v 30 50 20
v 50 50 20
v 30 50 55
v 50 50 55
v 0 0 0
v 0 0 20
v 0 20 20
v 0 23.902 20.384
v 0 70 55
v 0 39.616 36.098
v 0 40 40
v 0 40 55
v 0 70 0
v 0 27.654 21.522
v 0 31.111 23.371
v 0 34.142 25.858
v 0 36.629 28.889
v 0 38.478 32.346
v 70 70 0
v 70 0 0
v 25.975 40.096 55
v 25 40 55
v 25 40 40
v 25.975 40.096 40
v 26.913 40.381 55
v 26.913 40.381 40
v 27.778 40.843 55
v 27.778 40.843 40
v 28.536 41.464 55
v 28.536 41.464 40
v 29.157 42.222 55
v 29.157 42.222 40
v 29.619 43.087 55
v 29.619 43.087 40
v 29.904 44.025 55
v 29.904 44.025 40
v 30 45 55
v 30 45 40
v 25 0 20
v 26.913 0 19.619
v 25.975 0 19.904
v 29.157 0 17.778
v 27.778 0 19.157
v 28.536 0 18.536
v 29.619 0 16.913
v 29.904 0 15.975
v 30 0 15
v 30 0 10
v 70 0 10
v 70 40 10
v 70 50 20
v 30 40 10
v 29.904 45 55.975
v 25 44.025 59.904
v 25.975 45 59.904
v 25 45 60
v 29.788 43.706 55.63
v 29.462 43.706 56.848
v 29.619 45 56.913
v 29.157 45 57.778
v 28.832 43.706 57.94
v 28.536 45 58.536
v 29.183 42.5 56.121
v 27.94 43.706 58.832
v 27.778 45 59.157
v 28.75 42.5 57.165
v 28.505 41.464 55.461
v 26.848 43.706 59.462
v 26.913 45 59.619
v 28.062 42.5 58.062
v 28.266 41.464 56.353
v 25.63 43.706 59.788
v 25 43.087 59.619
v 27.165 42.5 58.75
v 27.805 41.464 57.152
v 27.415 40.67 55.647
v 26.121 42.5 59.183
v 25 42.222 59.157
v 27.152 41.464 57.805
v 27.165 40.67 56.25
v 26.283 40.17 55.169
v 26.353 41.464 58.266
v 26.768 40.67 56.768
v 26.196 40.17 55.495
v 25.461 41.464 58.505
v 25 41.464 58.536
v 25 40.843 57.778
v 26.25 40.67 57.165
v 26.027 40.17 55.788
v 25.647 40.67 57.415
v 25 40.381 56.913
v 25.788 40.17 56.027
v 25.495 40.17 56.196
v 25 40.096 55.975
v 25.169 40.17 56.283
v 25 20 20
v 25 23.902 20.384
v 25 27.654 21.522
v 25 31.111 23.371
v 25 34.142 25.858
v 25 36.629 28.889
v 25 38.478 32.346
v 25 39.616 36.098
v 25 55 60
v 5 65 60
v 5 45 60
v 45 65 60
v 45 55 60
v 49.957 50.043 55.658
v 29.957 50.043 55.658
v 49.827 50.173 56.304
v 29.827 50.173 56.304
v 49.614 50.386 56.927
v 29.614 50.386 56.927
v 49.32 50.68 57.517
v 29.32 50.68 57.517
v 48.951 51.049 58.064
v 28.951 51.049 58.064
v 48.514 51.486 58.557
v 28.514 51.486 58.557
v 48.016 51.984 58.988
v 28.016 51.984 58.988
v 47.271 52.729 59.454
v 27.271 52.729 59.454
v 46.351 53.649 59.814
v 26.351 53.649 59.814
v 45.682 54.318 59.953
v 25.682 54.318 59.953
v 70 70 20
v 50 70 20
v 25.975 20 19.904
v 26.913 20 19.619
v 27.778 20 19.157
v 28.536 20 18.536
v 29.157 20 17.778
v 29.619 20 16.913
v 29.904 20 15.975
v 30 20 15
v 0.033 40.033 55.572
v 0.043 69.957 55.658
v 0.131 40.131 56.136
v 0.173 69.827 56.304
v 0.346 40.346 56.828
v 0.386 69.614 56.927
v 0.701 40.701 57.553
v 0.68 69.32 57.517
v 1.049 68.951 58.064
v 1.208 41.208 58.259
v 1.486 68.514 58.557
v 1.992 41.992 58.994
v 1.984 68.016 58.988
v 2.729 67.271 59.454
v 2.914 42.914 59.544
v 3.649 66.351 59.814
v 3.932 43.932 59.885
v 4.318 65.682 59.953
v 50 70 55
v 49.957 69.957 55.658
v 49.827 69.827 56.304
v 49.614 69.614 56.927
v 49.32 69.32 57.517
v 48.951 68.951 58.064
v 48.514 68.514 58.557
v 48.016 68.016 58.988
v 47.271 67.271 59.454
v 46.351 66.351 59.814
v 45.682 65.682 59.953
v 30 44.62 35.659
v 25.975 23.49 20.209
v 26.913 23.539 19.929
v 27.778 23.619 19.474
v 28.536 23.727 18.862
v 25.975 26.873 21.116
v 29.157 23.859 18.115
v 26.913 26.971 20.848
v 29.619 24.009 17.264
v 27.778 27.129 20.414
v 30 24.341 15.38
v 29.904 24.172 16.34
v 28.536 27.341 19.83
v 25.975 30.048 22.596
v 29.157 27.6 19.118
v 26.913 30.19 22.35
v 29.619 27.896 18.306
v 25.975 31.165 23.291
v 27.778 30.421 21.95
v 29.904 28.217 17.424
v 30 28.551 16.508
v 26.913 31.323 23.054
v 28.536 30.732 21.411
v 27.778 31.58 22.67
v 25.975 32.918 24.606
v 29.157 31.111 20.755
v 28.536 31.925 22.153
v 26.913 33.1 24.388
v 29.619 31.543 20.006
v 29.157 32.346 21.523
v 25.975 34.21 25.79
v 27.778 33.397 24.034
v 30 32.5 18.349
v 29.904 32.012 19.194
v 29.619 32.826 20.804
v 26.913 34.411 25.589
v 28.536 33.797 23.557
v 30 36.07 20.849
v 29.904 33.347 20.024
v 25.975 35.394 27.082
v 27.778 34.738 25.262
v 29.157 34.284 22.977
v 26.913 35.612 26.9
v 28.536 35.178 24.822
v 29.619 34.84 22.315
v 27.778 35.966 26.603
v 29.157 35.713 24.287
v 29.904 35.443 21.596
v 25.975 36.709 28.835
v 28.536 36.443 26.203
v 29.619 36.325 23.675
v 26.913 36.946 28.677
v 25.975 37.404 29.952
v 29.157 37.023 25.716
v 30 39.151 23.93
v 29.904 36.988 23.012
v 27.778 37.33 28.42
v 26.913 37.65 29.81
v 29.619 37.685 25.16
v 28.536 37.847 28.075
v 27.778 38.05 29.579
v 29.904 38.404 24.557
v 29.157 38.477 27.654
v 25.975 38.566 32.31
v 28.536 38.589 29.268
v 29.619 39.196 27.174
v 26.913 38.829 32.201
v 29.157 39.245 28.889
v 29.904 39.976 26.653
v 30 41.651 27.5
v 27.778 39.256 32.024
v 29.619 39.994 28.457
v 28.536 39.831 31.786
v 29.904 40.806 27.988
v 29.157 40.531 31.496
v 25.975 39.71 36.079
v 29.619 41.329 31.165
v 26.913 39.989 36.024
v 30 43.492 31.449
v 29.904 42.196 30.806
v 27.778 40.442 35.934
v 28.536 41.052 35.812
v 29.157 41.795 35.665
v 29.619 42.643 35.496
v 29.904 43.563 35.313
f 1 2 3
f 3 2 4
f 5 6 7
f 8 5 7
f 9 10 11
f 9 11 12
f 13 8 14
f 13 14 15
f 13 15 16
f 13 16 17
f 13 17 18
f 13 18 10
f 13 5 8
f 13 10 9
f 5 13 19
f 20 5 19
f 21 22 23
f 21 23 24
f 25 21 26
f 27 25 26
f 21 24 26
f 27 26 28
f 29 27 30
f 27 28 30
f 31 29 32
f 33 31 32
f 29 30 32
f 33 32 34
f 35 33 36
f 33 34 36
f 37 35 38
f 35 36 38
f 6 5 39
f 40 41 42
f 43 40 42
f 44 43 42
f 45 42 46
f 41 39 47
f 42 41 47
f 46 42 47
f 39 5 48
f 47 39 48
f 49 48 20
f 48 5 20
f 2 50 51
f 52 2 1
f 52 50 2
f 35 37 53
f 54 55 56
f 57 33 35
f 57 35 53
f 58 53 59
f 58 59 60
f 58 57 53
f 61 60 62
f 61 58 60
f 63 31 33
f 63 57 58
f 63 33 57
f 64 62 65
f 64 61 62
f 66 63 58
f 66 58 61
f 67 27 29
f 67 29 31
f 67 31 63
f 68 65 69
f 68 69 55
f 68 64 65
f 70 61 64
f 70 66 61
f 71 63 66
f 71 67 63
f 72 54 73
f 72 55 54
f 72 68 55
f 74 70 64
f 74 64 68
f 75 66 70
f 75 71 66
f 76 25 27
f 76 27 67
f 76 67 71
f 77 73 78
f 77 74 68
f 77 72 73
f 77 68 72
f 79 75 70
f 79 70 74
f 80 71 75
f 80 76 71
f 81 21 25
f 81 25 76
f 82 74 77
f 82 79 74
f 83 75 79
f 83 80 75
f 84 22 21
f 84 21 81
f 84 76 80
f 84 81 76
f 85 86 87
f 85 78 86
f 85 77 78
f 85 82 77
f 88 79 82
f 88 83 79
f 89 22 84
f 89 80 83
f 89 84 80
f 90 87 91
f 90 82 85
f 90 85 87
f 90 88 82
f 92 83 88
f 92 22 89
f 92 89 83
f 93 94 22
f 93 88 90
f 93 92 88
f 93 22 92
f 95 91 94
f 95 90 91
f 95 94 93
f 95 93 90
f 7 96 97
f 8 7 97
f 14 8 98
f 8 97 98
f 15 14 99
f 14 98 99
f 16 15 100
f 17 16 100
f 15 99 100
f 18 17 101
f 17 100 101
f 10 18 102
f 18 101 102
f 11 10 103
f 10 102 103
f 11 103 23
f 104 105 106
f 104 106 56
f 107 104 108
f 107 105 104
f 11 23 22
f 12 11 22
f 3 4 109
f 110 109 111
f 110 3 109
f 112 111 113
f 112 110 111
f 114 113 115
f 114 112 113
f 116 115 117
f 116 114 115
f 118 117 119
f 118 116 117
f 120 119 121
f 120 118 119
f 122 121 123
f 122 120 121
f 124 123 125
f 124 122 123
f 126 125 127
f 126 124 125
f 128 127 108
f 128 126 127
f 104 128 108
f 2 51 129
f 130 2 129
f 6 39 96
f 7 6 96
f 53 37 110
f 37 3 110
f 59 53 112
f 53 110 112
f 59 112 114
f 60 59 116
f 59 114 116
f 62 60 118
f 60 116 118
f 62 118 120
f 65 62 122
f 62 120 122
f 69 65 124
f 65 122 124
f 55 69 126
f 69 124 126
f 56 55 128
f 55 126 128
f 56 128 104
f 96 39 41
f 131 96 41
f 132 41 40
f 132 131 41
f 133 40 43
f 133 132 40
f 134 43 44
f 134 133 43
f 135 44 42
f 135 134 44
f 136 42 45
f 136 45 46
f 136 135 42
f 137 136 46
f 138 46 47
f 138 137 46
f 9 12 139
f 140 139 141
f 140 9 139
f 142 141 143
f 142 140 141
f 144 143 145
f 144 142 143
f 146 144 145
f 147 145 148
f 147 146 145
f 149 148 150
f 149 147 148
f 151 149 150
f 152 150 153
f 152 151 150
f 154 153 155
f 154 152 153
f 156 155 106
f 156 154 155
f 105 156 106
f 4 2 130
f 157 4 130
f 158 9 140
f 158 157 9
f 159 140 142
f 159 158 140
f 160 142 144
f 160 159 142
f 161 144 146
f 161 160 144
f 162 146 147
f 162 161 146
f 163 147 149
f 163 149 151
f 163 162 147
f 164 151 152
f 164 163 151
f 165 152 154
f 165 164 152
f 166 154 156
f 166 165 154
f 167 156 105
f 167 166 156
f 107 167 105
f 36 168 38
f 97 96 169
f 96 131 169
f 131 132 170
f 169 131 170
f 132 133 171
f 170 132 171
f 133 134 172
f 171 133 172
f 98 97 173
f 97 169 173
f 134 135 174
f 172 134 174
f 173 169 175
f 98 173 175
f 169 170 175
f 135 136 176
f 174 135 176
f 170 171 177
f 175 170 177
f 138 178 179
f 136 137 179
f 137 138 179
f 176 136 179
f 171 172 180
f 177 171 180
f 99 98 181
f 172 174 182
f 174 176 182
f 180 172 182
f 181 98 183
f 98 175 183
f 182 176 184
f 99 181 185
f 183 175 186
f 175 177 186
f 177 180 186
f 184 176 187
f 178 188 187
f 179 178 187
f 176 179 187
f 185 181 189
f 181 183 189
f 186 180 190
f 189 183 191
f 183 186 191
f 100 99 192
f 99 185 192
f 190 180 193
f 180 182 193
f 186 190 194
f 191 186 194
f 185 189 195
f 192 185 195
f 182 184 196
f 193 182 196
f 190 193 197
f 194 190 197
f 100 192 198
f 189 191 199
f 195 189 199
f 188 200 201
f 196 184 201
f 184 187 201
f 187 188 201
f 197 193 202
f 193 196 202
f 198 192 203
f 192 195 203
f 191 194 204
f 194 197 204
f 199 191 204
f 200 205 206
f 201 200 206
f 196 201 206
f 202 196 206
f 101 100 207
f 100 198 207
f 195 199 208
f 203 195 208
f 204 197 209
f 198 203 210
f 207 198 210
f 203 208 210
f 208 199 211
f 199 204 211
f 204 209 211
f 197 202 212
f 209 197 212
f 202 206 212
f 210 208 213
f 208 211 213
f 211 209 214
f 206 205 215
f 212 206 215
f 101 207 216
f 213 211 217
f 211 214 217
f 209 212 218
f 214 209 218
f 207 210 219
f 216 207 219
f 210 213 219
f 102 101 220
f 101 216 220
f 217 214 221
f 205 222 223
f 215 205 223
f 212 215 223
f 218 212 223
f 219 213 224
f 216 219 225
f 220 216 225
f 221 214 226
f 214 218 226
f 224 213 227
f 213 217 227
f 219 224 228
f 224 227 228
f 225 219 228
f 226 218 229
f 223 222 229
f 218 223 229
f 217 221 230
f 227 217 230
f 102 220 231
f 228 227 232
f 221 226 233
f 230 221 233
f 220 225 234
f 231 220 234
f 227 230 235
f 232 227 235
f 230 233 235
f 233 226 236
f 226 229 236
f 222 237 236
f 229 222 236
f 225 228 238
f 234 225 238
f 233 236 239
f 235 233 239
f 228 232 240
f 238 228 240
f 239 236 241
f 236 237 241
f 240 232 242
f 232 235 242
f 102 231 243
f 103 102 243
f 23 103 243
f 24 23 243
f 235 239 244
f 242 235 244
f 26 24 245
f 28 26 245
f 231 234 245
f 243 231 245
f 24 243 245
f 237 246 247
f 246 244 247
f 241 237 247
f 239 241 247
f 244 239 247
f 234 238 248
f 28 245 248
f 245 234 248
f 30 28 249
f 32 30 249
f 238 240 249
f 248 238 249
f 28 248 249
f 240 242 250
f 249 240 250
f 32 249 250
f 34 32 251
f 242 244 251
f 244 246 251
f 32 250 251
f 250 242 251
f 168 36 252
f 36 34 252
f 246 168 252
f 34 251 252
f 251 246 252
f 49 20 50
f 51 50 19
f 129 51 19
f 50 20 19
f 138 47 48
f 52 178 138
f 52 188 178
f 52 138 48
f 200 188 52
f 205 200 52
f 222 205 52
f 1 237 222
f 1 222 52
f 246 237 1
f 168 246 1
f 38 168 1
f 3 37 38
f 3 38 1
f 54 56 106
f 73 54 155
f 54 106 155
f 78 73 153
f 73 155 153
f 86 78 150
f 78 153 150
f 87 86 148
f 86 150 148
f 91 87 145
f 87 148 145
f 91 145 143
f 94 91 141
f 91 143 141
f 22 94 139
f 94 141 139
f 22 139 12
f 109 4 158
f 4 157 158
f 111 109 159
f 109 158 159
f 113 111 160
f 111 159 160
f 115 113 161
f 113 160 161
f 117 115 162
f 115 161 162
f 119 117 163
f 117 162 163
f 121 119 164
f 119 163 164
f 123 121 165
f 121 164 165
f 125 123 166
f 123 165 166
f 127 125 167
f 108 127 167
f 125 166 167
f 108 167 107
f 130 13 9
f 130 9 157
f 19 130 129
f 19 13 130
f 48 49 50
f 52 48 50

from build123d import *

# Parameters (mm, degrees)
F0_W          = 70
F0_H          = 70
F1_DEPTH      = 60
F3_DEPTH      = 70.001
F4_W          = 50
F4_H          = 50
F5_DEPTH      = 40
F6_SIZE       = 10
F7_W          = 20
F7_H          = 40
F8_DEPTH      = 20
F9_R          = 5
F10_T1_DEPTH  = 32.5
F10_T3_DEPTH  = 15
F10_S7_W      = 5
F10_S7_H      = 5
F10_T8_DEPTH  = 5
F10_T12_ANGLE = 90


# Not quite as in the source:
# - a fillet or chamfer that OpenCascade refuses, or shapes differently, is made with other operations: its cross-section is extruded or revolved along the edge and cut away or added


with BuildPart() as f1:
    # F0 (on Top) → F1 (new body)
    with BuildSketch(Plane.XY):
        with Locations((35, 35)):
            Rectangle(F0_W, F0_H)
    extrude(amount=F1_DEPTH)

    # F2 (on face) → F3 (cut, through all)
    with BuildSketch(Plane.YZ.offset(70)):
        with BuildLine():
            Line((40, 60), (0, 60))
            Line((0, 60), (0, 20))
            Line((0, 20), (20, 20))
            ThreePointArc((20, 20), (34.1421356237, 25.8578643763), (40, 40))
            Line((40, 40), (40, 60))
        make_face()
    extrude(amount=-F3_DEPTH, mode=Mode.SUBTRACT)

    # F4 (on face) → F5 (cut)
    with BuildSketch(Plane.YZ.offset(70)):
        with Locations((25, 35)):
            Rectangle(F4_W, F4_H)
    extrude(amount=-F5_DEPTH, mode=Mode.SUBTRACT)

    # F6
    f6_edges = [f1.edges().sort_by_distance(p)[0] for p in [
        (50, 50, 10),
    ]]
    chamfer(f6_edges, length=F6_SIZE)

    # F7 (on face) → F8 (cut)
    with BuildSketch(Plane.YZ.offset(70)):
        with Locations((60, 40)):
            Rectangle(F7_W, F7_H)
    extrude(amount=-F8_DEPTH, mode=Mode.SUBTRACT)

    # F9
    f9_edges = [f1.edges().sort_by_distance(p)[0] for p in [
        (40, 50, 60),
        (30, 45, 60),
        (15, 40, 60),
        (0, 55, 60),
        (25, 70, 60),
        (50, 60, 60),
    ]]
    fillet(f9_edges, radius=F9_R)

    # F10: fillet of radius 5 on 1 edges, made by hand

    # F10_s2 → F10_t1 (cut)
    with BuildSketch(Plane.XZ.offset(-20)):
        with BuildLine():
            ThreePointArc((25, 20), (28.5355339059, 18.5355339059), (30, 15))
            Line((30, 15), (30, 20))
            Line((30, 20), (25, 20))
        make_face()
    extrude(amount=F10_T1_DEPTH, mode=Mode.SUBTRACT)

    # F10_s4 → F10_t3 (cut)
    with BuildSketch(Plane.XY.offset(40)):
        with BuildLine():
            ThreePointArc((25, 40), (28.5355339059, 41.4644660941), (30, 45))
            Line((30, 45), (30, 40))
            Line((30, 40), (25, 40))
        make_face()
    extrude(amount=F10_T3_DEPTH, mode=Mode.SUBTRACT)


with BuildPart() as f10_tool6:
    # F10_s7 → F10_t8 (new body)
    with BuildSketch(Plane.XZ.offset(-45)):
        with Locations((27.5, 57.5)):
            Rectangle(F10_S7_W, F10_S7_H)
    extrude(amount=F10_T8_DEPTH)

    # F10_s9 → F10_t10 (revolve, cut)
    with BuildSketch(Plane(origin=(25, 45, 55), x_dir=(-0.7071067812, 0, -0.7071067812), z_dir=(-0.7071067812, 0, 0.7071067812))):
        with BuildLine():
            ThreePointArc((0, -5), (5, 0), (0, 5))
            Line((0, 5), (0, -5))
        make_face()
    revolve(axis=Axis((25, 45, 55), (0, -1, 0)), mode=Mode.SUBTRACT)


with BuildPart() as f1_1:
    add(f1.part)

    # F10_t5: cut F10_tool6
    add(f10_tool6.part, mode=Mode.SUBTRACT)

    # F10_s11 → F10_t12 (revolve, cut)
    with BuildSketch(Plane.XZ.offset(-20)):
        with BuildLine():
            ThreePointArc((25, 20), (28.5355339059, 18.5355339059), (30, 15))
            Line((30, 15), (30, 20))
            Line((30, 20), (25, 20))
        make_face()
    revolve(axis=Axis((30, 20, 40), (1, 0, 0)), revolution_arc=F10_T12_ANGLE, mode=Mode.SUBTRACT)


solid = f1_1.part
